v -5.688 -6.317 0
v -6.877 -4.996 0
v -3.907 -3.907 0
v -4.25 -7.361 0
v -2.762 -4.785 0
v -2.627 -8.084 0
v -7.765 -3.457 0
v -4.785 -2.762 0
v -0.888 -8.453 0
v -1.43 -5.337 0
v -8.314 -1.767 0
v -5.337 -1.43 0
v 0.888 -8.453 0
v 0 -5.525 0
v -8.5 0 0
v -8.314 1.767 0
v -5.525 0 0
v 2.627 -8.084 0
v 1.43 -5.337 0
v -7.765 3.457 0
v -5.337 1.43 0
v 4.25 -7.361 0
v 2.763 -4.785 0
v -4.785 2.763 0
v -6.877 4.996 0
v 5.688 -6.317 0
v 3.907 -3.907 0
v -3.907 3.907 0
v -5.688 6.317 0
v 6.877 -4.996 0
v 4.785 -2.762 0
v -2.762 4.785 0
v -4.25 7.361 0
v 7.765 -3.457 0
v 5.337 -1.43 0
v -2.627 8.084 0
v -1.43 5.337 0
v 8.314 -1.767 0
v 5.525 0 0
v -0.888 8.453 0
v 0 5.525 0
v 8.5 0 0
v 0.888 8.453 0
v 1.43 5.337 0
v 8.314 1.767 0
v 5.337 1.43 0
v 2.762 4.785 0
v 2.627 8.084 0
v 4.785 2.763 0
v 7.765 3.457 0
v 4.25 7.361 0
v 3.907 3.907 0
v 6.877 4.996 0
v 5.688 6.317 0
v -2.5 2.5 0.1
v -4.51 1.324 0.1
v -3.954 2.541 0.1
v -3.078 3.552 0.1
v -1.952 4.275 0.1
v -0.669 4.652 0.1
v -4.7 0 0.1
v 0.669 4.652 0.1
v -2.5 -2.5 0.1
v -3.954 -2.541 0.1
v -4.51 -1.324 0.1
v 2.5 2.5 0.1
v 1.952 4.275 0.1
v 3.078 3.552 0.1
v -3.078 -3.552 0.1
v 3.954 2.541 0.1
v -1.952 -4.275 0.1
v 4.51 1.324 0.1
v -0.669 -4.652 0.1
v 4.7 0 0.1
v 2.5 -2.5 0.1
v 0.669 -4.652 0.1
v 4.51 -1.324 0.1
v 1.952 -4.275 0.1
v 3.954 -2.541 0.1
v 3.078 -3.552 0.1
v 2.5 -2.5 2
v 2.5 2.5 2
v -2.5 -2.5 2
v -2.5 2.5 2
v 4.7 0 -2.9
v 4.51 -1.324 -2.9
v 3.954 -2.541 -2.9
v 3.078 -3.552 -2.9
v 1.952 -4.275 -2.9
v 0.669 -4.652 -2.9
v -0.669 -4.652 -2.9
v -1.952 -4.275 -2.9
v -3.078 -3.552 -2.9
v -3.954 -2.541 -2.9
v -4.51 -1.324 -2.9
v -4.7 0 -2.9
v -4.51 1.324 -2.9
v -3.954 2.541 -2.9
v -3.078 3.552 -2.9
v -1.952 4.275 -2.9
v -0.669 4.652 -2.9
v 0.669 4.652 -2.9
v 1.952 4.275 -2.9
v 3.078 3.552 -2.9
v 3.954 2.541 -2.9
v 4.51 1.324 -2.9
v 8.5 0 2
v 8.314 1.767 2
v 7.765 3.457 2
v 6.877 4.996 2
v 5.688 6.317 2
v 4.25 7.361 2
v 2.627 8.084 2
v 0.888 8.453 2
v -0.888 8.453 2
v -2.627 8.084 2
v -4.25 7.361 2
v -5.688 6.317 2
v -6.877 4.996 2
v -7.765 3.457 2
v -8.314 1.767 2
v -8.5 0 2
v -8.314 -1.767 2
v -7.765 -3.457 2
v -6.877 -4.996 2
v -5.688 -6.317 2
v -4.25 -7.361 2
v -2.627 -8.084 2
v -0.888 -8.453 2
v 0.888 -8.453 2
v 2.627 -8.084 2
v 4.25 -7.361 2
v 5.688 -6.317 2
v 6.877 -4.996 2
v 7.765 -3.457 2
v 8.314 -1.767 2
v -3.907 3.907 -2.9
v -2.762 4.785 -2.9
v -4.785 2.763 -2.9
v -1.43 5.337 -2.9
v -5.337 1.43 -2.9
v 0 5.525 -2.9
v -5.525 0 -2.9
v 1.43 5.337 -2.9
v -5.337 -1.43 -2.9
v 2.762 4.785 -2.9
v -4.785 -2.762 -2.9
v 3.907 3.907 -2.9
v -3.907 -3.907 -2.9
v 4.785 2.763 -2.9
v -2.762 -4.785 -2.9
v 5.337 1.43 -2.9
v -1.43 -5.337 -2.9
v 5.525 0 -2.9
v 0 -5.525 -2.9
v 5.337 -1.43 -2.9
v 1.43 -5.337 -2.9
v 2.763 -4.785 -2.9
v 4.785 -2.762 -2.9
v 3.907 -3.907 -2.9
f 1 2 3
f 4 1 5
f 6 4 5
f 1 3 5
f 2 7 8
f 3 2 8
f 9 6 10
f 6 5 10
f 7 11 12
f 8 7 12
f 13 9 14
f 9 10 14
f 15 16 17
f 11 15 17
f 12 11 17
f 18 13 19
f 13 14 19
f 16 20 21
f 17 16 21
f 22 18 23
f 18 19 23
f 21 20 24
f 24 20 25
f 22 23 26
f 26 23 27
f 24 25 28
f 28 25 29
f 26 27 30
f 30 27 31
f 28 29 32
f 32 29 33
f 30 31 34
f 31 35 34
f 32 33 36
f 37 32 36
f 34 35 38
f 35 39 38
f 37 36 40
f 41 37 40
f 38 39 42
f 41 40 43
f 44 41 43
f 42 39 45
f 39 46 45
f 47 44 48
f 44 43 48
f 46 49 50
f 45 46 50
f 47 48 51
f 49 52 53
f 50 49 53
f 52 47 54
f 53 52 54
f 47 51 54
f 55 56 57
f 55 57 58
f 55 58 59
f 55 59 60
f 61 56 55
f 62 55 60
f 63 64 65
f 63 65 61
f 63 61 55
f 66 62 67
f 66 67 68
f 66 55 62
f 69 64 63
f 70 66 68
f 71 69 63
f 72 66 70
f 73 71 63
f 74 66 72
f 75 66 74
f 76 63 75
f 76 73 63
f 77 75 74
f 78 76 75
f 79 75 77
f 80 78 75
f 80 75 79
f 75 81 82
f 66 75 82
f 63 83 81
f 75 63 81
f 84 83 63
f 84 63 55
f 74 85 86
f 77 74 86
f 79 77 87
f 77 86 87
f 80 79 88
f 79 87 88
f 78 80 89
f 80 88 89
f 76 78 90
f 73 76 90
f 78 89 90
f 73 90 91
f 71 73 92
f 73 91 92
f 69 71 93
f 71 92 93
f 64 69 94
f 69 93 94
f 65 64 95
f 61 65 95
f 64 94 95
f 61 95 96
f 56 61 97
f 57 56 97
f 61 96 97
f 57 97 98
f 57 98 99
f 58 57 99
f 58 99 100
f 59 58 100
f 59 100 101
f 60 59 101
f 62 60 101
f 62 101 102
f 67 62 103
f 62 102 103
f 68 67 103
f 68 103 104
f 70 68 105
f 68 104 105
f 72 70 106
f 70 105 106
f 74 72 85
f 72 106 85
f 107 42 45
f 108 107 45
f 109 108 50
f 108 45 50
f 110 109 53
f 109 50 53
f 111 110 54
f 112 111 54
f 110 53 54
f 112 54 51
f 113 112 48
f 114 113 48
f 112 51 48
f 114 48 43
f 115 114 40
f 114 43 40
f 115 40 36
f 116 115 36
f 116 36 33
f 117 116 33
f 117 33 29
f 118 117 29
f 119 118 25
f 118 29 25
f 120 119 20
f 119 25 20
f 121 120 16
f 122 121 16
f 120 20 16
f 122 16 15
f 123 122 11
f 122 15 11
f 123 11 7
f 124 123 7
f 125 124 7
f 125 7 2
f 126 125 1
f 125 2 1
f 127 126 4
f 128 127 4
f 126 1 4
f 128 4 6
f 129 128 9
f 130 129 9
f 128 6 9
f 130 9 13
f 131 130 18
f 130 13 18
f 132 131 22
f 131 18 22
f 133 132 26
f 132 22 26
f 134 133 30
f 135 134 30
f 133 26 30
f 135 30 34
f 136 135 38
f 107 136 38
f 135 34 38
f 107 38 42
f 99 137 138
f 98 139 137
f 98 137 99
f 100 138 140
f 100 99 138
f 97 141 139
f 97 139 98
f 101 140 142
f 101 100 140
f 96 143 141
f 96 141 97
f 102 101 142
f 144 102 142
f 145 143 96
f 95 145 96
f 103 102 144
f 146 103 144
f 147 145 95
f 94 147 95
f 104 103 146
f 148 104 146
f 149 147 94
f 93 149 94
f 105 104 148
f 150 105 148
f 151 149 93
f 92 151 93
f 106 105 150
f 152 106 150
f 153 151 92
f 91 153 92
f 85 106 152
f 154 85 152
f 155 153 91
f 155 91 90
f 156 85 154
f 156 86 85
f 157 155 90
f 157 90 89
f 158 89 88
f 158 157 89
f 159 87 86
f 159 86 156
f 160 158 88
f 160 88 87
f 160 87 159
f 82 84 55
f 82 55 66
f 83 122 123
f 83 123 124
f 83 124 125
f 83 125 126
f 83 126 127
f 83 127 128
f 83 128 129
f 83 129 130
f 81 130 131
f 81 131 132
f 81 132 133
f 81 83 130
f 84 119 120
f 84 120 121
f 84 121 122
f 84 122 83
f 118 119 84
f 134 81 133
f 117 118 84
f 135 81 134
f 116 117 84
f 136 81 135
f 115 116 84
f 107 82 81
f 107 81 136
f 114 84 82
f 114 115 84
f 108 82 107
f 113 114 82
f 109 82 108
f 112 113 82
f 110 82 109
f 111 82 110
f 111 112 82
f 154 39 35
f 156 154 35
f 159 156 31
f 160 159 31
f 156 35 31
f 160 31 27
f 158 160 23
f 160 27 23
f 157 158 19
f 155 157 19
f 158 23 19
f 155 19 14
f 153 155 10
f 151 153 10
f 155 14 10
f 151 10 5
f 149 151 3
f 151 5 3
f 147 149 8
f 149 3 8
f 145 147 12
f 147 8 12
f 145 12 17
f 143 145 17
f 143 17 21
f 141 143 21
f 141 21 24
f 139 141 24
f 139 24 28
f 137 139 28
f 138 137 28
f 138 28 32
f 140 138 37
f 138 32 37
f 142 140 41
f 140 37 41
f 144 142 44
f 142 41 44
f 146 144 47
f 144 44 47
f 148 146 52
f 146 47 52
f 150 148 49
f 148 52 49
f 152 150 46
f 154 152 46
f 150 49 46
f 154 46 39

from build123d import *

# Parameters (mm, degrees)
F0_R     = 8.5
F1_DEPTH = 2
F2_R     = 5.525
F3_DEPTH = 2.9
F4_R     = 4.7
F5_DEPTH = 3
F6_W     = 5
F6_H     = 5
F7_DEPTH = 25


with BuildPart() as f1:
    # F0 (on Top) → F1 (new body)
    with BuildSketch(Plane.XY):
        Circle(F0_R)
    extrude(amount=F1_DEPTH)

    # F2 (on face) → F3 (join)
    with BuildSketch(Plane(origin=(0, 0, 0), x_dir=(1, 0, 0), z_dir=(0, 0, -1))):
        Circle(F2_R)
    extrude(amount=F3_DEPTH)

    # F4 (on face) → F5 (cut)
    with BuildSketch(Plane(origin=(0, 0, -2.9), x_dir=(1, 0, 0), z_dir=(0, 0, -1))):
        Circle(F4_R)
    extrude(amount=-F5_DEPTH, mode=Mode.SUBTRACT)

    # F6 (on face) → F7 (cut)
    with BuildSketch(Plane.XY.offset(2)):
        Rectangle(F6_W, F6_H)
    extrude(amount=-F7_DEPTH, mode=Mode.SUBTRACT)


solid = f1.part
